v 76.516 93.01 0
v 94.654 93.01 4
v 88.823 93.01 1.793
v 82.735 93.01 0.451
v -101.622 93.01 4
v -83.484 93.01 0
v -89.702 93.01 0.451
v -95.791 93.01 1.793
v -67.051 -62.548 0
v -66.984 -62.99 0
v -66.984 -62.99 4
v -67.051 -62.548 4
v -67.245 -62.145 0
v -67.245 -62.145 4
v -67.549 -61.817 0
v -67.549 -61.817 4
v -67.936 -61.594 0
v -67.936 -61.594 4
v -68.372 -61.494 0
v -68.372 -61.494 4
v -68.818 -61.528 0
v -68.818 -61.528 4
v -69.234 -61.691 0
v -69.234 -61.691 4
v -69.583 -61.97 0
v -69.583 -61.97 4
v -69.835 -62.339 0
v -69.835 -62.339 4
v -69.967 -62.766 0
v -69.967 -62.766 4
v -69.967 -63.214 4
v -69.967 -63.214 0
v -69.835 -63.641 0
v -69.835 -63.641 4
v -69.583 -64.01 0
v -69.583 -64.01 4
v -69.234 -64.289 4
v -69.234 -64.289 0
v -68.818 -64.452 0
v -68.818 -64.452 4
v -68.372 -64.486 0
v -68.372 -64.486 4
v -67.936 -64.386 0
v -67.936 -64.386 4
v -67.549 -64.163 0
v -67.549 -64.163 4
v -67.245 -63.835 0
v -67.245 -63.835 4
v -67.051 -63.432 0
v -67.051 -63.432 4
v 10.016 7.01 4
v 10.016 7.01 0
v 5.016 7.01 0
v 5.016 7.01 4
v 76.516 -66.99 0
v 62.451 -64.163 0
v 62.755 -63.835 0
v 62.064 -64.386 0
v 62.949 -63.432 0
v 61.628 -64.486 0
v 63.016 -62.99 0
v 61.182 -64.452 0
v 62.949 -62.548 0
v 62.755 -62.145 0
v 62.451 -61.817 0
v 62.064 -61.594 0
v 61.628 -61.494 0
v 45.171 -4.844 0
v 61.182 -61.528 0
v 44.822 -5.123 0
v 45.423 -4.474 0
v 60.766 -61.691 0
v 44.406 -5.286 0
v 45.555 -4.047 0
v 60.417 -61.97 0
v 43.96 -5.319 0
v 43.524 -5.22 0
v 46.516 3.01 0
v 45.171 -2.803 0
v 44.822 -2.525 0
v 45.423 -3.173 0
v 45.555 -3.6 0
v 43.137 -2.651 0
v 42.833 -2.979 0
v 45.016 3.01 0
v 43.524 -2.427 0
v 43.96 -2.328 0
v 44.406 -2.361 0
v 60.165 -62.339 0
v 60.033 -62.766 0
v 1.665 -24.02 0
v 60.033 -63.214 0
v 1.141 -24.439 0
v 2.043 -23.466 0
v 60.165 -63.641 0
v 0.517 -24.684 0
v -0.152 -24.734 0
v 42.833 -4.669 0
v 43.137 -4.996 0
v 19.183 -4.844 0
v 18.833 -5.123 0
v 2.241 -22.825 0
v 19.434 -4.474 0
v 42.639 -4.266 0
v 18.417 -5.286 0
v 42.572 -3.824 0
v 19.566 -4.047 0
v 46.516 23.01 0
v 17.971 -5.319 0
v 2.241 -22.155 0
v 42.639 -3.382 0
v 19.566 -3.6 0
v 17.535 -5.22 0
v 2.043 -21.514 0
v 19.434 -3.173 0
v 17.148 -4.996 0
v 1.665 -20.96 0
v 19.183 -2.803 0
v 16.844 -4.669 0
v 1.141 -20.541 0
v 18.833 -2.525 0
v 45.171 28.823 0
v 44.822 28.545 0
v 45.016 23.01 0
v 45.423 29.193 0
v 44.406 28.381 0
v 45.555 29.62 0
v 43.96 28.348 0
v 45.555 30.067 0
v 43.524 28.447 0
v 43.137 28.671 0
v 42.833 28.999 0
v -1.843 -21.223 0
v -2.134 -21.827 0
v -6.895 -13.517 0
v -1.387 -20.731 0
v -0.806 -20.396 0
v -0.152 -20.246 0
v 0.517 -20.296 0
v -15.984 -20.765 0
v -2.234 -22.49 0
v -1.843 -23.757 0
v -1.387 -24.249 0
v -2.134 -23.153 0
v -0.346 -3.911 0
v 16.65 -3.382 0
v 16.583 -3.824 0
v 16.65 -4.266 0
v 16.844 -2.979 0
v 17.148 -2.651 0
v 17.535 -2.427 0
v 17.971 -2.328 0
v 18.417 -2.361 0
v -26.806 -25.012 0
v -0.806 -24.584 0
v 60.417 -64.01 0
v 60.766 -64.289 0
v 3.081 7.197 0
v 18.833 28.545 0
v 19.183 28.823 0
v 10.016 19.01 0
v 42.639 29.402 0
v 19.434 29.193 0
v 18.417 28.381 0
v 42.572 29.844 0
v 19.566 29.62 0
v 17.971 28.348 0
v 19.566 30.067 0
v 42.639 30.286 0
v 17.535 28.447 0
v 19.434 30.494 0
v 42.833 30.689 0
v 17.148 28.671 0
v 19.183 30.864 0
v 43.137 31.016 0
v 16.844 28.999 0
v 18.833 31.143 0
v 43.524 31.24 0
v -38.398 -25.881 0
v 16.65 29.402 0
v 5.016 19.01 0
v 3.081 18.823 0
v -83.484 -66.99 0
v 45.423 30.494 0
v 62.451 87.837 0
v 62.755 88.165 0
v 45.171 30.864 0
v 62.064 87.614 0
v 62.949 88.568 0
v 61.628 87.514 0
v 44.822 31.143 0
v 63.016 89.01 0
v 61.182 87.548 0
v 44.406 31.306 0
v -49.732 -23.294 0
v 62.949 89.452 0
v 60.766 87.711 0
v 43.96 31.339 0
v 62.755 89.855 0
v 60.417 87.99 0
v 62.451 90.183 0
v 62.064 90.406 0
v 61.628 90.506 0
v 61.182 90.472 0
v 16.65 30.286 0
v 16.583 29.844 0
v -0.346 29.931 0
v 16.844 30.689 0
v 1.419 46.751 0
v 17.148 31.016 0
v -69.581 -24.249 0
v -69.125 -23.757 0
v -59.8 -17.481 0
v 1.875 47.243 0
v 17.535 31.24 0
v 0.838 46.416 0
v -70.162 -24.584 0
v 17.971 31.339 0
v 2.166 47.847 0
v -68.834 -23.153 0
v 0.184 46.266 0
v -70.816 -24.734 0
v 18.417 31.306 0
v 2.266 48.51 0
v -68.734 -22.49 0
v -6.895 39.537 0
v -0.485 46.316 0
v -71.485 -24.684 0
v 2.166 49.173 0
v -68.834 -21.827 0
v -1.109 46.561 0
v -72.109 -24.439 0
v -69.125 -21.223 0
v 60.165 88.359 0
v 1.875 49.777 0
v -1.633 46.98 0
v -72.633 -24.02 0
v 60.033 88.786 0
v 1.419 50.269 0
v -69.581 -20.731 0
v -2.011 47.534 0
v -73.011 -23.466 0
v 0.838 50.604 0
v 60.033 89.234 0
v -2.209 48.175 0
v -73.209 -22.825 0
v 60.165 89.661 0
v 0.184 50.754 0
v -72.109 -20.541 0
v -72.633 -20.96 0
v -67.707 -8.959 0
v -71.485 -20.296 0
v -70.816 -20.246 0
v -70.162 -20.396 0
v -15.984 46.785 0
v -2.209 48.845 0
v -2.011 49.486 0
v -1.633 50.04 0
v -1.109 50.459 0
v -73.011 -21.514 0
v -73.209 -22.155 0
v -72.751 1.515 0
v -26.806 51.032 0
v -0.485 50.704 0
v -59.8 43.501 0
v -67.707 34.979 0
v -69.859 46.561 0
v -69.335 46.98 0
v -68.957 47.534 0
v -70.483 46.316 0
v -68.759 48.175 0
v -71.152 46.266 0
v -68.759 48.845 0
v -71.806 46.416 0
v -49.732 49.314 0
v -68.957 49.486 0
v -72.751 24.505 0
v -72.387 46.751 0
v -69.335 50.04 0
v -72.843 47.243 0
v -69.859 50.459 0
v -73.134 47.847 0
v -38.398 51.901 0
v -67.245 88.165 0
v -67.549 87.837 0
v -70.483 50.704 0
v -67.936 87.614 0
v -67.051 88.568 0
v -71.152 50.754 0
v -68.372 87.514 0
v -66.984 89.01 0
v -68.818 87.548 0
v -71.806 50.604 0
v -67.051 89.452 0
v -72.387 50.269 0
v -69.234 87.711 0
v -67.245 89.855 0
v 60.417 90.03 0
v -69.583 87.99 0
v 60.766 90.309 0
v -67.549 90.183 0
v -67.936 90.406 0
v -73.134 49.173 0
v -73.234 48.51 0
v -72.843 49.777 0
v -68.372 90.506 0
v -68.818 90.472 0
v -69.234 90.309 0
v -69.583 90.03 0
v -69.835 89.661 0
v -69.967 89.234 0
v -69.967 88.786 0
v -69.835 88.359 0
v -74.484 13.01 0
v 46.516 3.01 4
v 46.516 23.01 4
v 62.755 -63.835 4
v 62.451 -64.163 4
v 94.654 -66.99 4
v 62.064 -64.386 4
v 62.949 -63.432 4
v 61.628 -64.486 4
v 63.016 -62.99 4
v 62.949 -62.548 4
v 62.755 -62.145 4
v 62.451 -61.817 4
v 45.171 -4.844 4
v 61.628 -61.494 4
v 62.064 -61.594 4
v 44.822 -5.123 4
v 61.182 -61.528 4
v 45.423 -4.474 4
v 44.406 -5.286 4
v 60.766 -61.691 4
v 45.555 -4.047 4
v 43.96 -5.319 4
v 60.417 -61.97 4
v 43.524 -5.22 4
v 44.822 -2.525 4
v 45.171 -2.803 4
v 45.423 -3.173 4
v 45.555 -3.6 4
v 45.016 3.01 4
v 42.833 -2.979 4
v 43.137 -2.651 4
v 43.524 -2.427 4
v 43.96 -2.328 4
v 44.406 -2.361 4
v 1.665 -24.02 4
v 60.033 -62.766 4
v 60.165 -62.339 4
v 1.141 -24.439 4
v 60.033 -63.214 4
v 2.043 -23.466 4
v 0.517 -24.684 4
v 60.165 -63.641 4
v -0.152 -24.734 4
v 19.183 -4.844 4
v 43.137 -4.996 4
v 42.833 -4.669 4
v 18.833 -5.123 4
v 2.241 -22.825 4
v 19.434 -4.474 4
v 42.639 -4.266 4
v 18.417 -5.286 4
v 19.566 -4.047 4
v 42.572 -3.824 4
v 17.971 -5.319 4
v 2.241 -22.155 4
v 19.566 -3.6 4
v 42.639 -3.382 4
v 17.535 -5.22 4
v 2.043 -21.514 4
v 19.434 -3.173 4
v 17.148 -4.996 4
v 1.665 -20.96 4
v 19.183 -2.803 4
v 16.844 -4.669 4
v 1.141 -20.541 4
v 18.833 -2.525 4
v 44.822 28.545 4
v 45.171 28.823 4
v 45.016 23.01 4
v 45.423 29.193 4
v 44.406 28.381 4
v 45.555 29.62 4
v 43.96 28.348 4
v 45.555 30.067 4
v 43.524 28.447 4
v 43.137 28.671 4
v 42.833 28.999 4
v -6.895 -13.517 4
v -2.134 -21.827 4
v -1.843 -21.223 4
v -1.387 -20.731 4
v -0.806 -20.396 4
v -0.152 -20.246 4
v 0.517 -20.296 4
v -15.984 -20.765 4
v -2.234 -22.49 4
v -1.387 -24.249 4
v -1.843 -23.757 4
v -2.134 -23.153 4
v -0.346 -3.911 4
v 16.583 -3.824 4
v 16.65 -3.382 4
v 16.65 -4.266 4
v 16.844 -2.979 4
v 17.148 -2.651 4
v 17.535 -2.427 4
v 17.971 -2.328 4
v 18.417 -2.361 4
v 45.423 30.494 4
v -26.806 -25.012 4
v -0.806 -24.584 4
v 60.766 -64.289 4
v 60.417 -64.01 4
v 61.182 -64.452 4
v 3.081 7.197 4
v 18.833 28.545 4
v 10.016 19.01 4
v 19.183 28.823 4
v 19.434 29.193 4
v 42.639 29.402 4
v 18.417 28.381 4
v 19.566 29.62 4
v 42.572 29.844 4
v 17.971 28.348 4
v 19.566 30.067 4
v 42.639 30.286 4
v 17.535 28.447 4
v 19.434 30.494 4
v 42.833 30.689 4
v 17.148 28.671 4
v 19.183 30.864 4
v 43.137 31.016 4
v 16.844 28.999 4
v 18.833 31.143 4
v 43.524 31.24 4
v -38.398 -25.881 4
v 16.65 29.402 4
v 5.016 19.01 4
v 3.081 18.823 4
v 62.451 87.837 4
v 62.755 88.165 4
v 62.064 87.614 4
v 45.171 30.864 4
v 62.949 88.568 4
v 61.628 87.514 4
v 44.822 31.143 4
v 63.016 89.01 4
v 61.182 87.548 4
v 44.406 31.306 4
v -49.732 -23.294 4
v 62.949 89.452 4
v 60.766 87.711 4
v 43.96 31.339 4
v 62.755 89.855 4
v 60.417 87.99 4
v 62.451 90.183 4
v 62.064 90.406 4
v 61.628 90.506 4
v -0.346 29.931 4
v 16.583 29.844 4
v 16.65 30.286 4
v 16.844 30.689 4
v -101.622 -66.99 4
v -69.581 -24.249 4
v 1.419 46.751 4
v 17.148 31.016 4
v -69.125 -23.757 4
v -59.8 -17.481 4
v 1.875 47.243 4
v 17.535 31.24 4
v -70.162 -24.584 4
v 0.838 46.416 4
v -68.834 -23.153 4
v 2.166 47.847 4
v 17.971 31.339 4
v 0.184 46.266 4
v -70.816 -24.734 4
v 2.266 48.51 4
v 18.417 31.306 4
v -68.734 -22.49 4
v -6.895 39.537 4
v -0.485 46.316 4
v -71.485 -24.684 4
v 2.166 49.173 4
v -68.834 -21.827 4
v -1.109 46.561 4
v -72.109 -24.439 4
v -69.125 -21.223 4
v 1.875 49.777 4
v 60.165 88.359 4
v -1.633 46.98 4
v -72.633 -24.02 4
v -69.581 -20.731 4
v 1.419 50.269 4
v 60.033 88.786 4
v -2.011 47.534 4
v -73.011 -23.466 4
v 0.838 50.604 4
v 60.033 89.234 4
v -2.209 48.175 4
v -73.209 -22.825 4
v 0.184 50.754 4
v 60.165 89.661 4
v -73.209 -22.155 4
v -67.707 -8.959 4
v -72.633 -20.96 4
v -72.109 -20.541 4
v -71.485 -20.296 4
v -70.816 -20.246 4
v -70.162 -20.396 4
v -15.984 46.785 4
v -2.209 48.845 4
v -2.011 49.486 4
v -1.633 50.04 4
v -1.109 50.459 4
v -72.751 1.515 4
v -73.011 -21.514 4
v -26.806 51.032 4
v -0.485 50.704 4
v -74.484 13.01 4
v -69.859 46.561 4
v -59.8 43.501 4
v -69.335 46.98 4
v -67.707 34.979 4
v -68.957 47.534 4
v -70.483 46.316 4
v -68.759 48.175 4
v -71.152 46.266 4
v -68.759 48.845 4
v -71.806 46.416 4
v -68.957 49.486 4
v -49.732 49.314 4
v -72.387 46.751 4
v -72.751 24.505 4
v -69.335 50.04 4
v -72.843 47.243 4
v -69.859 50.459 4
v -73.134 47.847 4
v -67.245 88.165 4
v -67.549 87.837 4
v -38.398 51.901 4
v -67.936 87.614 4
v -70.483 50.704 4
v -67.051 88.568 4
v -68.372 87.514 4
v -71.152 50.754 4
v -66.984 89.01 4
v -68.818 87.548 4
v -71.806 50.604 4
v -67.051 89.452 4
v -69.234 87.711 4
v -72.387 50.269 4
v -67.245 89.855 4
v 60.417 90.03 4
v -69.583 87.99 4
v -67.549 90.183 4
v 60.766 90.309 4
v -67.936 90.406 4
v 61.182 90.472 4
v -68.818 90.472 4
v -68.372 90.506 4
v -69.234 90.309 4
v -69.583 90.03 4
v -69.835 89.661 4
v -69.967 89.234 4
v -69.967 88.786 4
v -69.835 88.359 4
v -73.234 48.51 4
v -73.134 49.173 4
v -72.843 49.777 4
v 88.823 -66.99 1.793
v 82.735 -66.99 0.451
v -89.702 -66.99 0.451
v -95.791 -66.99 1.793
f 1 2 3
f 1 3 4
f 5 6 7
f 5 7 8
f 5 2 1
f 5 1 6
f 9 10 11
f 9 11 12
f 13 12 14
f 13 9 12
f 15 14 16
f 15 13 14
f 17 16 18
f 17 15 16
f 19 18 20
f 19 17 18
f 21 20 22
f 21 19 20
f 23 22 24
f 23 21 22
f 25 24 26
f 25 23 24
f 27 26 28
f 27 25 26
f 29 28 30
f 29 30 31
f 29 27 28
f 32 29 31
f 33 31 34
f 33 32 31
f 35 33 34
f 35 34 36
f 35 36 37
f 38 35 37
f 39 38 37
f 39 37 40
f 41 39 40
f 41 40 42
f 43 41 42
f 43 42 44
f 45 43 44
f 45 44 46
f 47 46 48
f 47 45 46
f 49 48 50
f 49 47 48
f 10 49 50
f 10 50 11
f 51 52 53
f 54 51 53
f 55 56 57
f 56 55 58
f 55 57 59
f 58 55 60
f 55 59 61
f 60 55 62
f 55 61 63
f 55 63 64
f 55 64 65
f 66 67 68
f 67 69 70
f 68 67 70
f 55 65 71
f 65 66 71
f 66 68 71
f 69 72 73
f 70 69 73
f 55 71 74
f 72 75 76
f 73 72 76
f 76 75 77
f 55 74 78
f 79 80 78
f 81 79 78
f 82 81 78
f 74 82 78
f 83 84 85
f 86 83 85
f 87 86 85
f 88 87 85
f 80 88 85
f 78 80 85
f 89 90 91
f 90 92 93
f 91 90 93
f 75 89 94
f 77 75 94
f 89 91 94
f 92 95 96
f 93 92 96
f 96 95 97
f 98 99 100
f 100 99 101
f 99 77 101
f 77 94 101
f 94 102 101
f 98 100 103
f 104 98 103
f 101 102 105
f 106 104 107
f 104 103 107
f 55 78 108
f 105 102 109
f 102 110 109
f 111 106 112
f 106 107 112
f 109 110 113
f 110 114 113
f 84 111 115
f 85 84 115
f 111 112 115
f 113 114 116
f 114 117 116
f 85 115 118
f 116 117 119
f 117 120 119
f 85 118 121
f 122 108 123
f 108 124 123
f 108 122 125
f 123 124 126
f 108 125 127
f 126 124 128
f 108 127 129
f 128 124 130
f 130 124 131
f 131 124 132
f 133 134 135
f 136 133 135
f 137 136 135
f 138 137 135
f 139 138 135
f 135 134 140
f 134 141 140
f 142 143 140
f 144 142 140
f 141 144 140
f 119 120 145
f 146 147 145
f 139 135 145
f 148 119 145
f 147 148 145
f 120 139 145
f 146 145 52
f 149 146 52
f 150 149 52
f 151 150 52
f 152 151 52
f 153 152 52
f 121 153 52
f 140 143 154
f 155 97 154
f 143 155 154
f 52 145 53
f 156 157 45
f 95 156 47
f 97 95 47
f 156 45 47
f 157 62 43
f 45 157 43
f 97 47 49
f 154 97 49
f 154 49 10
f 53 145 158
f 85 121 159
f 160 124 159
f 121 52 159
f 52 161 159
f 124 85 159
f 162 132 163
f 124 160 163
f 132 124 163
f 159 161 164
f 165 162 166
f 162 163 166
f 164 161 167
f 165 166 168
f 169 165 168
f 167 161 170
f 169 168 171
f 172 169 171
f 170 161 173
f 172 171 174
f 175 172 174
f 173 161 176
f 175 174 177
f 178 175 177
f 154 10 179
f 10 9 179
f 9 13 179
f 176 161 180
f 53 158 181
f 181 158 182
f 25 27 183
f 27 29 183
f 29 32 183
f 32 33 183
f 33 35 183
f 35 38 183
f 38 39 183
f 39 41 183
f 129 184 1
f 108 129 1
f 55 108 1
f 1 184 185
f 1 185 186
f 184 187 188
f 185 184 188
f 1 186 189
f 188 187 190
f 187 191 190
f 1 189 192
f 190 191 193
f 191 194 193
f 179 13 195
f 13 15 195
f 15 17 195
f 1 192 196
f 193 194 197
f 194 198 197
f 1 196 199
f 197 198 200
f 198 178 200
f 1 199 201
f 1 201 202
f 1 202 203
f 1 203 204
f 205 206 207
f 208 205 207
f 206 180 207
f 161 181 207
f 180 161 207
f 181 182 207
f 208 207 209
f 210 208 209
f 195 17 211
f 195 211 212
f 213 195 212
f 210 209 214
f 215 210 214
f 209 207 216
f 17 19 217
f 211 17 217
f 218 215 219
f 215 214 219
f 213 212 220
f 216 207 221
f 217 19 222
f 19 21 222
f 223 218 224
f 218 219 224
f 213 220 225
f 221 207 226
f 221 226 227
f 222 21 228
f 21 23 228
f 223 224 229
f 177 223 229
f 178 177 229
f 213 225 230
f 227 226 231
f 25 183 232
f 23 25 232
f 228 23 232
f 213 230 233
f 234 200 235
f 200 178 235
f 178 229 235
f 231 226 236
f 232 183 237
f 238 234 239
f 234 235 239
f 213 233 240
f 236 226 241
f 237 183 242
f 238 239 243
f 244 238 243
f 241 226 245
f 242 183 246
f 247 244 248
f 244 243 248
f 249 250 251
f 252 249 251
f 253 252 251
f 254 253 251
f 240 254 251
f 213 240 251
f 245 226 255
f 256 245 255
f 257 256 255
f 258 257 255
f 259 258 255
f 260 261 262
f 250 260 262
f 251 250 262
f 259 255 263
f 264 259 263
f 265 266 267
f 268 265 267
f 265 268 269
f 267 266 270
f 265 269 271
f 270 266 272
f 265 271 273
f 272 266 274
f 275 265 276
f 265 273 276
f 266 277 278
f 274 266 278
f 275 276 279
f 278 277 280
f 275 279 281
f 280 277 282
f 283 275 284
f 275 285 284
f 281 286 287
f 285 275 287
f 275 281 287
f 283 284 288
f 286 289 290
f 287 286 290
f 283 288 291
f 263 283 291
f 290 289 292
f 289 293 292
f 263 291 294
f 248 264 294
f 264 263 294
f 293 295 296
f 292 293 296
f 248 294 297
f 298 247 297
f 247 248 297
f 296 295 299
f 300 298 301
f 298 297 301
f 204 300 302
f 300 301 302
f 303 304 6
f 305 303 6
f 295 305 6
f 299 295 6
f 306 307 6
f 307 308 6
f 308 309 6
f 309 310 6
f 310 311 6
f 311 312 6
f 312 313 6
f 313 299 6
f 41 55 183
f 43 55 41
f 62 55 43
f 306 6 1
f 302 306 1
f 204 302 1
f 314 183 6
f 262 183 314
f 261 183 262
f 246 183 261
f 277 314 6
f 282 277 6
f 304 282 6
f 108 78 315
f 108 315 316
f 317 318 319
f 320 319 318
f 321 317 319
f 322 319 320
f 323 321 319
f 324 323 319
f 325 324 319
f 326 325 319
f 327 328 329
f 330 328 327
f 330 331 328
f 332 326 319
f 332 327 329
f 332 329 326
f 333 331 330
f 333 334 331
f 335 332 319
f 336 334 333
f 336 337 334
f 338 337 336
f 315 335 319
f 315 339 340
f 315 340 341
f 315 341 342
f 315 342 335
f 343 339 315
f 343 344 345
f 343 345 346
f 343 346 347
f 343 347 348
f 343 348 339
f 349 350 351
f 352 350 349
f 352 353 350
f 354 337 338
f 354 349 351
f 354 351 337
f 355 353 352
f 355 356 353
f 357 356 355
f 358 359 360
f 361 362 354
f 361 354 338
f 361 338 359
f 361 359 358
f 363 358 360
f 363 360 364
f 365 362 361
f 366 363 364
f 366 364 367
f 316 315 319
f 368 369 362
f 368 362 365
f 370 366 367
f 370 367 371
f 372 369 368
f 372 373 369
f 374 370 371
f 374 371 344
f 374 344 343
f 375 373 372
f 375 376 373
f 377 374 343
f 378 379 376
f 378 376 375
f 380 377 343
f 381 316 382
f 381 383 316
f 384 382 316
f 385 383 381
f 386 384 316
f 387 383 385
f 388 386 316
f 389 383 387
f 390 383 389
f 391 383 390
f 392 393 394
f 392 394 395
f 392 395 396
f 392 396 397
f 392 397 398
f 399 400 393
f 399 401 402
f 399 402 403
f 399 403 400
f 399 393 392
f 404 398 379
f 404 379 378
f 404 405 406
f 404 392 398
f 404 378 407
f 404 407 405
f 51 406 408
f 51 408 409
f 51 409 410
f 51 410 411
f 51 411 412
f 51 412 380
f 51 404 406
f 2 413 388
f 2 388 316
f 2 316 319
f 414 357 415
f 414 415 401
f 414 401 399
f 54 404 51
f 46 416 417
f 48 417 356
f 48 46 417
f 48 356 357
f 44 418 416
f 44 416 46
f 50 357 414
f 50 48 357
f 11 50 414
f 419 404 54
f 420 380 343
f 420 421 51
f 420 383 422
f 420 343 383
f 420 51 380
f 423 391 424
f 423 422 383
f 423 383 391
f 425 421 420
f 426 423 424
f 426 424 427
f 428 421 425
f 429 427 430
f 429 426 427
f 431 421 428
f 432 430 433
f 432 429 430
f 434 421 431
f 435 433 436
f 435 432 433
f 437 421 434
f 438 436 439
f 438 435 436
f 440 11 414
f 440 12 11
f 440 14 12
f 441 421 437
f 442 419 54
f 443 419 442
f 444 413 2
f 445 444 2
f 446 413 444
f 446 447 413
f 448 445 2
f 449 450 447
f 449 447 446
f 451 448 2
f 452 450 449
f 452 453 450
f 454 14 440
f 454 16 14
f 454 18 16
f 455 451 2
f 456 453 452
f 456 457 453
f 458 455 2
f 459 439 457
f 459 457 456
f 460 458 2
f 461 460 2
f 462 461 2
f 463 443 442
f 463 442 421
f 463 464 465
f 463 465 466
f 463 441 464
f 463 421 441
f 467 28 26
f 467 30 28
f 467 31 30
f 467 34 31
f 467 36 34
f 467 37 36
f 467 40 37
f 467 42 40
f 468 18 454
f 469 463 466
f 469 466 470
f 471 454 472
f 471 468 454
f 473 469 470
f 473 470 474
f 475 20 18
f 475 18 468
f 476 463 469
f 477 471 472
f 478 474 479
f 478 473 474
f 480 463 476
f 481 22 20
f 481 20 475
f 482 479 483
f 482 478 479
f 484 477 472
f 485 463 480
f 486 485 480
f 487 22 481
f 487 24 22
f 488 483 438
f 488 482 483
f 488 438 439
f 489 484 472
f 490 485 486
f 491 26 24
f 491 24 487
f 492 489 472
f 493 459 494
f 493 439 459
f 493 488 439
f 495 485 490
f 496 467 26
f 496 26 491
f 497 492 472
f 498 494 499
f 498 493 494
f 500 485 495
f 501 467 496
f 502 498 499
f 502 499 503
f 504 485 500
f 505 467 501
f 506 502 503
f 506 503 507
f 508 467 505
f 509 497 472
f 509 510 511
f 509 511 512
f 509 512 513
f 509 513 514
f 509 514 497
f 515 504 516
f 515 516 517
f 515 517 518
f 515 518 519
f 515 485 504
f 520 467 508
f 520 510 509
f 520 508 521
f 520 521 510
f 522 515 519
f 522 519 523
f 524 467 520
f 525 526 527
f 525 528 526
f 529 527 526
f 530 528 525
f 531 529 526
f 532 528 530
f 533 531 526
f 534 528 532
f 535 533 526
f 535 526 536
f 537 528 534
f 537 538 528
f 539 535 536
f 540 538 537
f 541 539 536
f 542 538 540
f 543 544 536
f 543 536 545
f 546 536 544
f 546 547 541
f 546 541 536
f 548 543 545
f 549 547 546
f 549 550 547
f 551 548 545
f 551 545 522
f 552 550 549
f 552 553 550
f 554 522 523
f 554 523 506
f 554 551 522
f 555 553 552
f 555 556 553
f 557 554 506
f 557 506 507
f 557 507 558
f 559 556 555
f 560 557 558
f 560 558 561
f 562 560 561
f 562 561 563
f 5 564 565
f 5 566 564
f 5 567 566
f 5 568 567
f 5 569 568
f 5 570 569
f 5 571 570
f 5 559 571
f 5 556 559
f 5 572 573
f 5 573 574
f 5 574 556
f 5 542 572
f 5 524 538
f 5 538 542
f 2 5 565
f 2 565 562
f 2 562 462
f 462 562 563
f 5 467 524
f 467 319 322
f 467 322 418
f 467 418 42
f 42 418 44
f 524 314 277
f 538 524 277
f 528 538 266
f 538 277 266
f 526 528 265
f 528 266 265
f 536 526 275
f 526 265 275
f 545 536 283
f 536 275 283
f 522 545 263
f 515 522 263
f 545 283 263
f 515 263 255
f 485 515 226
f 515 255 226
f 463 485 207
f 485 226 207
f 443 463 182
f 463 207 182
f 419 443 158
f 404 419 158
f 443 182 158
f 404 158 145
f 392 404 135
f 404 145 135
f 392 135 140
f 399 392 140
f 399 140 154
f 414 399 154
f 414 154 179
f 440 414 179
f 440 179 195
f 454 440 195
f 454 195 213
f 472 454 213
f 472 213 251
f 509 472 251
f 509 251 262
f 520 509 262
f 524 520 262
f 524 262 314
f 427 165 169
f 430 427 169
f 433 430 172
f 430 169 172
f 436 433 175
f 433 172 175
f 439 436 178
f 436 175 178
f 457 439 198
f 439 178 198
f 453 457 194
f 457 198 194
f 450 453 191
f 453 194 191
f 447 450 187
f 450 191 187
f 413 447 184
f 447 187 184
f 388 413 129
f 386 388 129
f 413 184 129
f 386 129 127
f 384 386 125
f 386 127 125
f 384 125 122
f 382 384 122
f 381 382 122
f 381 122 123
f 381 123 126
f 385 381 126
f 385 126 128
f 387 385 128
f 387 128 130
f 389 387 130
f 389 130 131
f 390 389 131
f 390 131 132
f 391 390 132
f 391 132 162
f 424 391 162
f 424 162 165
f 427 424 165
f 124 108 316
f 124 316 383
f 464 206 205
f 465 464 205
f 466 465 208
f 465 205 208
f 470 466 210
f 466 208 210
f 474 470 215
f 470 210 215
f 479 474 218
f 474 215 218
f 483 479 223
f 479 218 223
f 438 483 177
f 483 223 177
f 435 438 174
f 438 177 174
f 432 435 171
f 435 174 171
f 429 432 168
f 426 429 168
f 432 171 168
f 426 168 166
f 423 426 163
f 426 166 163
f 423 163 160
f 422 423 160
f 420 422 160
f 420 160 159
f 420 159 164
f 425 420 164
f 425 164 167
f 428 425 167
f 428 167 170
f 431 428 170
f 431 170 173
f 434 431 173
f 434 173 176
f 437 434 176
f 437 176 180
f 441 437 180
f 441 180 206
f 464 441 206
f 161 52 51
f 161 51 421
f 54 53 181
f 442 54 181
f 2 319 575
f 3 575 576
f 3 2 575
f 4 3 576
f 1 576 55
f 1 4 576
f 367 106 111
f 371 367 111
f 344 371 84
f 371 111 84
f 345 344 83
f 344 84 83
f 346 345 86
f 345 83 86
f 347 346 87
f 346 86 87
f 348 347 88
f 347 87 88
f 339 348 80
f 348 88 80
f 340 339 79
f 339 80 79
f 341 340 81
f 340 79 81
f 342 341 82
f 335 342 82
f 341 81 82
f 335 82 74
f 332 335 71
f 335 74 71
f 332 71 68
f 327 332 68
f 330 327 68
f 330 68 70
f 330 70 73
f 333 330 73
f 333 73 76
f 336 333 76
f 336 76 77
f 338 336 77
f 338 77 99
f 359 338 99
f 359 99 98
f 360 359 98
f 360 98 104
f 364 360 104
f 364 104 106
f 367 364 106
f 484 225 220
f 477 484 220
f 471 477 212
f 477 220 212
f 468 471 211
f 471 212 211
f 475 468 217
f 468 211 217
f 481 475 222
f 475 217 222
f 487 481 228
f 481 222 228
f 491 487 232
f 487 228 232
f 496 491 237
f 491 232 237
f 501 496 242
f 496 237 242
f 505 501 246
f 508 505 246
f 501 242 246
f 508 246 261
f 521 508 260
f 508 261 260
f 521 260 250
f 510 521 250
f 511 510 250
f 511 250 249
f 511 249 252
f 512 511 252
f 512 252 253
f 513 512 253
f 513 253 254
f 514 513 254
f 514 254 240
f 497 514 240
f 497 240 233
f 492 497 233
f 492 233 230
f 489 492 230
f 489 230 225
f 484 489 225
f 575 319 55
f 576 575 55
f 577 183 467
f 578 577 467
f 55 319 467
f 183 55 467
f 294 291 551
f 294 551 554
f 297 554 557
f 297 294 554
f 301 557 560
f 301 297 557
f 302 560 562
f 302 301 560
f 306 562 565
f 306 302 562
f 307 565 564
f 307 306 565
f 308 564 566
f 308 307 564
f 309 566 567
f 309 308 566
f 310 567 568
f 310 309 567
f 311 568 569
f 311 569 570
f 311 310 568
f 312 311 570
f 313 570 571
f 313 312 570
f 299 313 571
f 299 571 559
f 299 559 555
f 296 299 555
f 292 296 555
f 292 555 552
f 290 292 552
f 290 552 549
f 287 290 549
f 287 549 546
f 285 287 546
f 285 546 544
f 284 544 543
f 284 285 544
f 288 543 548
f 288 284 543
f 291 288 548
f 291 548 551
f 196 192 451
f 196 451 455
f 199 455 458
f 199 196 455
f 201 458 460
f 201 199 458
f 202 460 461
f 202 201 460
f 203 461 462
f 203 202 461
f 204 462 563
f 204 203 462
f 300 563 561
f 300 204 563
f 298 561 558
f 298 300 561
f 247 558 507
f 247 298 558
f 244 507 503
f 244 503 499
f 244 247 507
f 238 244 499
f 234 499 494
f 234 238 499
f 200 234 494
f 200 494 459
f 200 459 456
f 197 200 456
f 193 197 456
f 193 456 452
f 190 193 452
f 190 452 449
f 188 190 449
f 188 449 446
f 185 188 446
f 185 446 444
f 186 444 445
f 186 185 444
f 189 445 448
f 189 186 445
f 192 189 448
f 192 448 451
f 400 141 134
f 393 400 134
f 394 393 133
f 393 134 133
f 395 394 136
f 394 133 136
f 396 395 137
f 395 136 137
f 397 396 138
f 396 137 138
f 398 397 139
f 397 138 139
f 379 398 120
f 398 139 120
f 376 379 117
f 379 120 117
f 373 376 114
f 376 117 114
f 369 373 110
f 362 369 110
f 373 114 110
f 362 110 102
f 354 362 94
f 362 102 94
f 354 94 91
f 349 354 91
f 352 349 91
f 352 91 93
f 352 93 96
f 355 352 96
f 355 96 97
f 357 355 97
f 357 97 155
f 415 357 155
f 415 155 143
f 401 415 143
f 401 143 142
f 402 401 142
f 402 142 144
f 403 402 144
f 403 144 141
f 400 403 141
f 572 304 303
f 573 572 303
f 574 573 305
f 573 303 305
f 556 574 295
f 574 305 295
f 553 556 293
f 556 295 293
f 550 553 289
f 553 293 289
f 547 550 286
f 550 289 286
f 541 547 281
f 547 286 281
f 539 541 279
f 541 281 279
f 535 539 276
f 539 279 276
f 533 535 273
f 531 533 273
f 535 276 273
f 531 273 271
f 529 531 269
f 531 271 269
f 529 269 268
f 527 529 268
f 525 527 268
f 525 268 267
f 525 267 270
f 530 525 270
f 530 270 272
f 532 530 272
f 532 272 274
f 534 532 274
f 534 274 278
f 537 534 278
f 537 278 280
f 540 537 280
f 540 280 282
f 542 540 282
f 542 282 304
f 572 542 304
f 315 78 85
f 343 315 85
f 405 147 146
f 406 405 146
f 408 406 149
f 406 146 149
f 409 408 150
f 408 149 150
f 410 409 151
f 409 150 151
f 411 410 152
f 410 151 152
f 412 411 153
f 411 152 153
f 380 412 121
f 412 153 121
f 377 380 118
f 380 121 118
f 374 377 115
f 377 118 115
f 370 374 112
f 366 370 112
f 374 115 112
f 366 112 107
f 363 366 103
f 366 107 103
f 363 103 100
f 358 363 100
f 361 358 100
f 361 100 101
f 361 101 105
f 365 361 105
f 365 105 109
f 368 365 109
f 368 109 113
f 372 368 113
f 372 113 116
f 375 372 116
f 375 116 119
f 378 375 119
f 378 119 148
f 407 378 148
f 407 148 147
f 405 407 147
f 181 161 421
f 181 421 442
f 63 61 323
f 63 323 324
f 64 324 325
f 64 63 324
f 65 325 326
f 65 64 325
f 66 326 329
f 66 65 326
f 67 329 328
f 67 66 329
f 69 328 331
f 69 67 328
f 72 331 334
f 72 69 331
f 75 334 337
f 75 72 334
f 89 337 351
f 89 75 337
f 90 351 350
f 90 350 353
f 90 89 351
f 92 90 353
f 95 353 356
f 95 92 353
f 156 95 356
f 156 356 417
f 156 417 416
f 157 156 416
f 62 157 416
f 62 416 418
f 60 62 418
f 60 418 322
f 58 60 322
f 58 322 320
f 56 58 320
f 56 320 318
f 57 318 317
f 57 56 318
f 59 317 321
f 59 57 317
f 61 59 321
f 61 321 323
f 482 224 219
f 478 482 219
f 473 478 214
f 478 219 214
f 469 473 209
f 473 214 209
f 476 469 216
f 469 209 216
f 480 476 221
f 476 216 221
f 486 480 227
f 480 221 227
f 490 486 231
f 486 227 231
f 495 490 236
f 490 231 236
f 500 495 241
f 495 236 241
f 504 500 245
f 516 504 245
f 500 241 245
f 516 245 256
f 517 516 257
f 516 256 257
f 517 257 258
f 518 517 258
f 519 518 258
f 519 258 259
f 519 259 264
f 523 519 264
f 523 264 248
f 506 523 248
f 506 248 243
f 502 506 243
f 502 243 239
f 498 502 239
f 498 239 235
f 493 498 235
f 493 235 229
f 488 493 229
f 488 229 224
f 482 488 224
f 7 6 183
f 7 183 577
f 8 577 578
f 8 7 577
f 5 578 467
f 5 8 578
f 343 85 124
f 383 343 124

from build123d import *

# Parameters (mm, degrees)
SCHIZZO1_W                   = 160
SCHIZZO1_H                   = 160
SCHIZZO1_R                   = 1.5
ESTRUSIONE_ESTRUSIONE1_DEPTH = 4
SCHIZZO2_R                   = 1.5
SCHIZZO2_W                   = 1.5
SCHIZZO2_H                   = 20
TAGLIO_ESTRUSIONE1_DEPTH     = 36
SCHIZZO3_R                   = 39
SCHIZZO3_R_2                 = 2.25
SCHIZZO3_W                   = 5
SCHIZZO3_H                   = 12
TAGLIO_ESTRUSIONE2_DEPTH     = 7
SCHIZZO4_W                   = 4
SCHIZZO4_H                   = 160
ESTRUSIONE_ESTRUSIONE2_DEPTH = 18.13835714
SCHIZZO5_W                   = 4
SCHIZZO5_H                   = 160
ESTRUSIONE_ESTRUSIONE3_DEPTH = 18.13835714
TAGLIO_ESTRUSIONE3_DEPTH     = 229.13835714


with BuildPart() as part:
    # Schizzo1 → Estrusione-Estrusione1 (new body)
    with BuildSketch(Plane.XY):
        with Locations((-3.483874863, 13.01)):
            Rectangle(SCHIZZO1_W, SCHIZZO1_H)
        with Locations((-68.483874863, 89.01)):
            Circle(SCHIZZO1_R, mode=Mode.SUBTRACT)
        with Locations((61.516125137, 89.01)):
            Circle(SCHIZZO1_R, mode=Mode.SUBTRACT)
        with Locations((-68.483874863, -62.99)):
            Circle(SCHIZZO1_R, mode=Mode.SUBTRACT)
        with Locations((61.516125137, -62.99)):
            Circle(SCHIZZO1_R, mode=Mode.SUBTRACT)
    extrude(amount=ESTRUSIONE_ESTRUSIONE1_DEPTH)

    # Schizzo2 → Taglio-Estrusione1 (cut)
    with BuildSketch(Plane(origin=(0, 0, 0), x_dir=(-1, 0, 0), z_dir=(0, 0, -1))):
        with Locations((-44.071905048, 29.8436475)):
            Circle(SCHIZZO2_R)
        with Locations((-44.071905048, -3.8236475)):
            Circle(SCHIZZO2_R)
        with Locations((-18.082922837, -3.8236475)):
            Circle(SCHIZZO2_R)
        with Locations((-18.082922837, 29.8436475)):
            Circle(SCHIZZO2_R)
        with Locations((-45.766125137, 13.01)):
            Rectangle(SCHIZZO2_W, SCHIZZO2_H)
    extrude(amount=-TAGLIO_ESTRUSIONE1_DEPTH, mode=Mode.SUBTRACT)

    # Schizzo3 → Taglio-Estrusione2 (cut)
    with BuildSketch(Plane(origin=(0, 0, 0), x_dir=(-1, 0, 0), z_dir=(0, 0, -1))):
        with Locations((35.483874863, 13.01)):
            Circle(SCHIZZO3_R)
        with Locations((70.98387486, 48.509999997)):
            Circle(SCHIZZO3_R_2)
        with Locations(Location((70.98387486, -22.489999997, 0), (0, 0, 180))):
            Circle(SCHIZZO3_R_2)
        with Locations(Location((-0.016125134, 48.509999997, 0), (0, 0, 180))):
            Circle(SCHIZZO3_R_2)
        with Locations((-0.016125134, -22.489999997)):
            Circle(SCHIZZO3_R_2)
        with Locations((-7.516125137, 13.01)):
            Rectangle(SCHIZZO3_W, SCHIZZO3_H)
    extrude(amount=-TAGLIO_ESTRUSIONE2_DEPTH, mode=Mode.SUBTRACT)

    # Schizzo4 → Estrusione-Estrusione2 (add)
    with BuildSketch(Plane.ZY.offset(83.483874863)):
        with Locations((2, 13.01)):
            Rectangle(SCHIZZO4_W, SCHIZZO4_H)
    extrude(amount=ESTRUSIONE_ESTRUSIONE2_DEPTH)

    # Schizzo5 → Estrusione-Estrusione3 (add)
    with BuildSketch(Plane(origin=(76.516125137, 0, 0), x_dir=(0, 0, -1), z_dir=(1, 0, 0))):
        with Locations((-2, 13.01)):
            Rectangle(SCHIZZO5_W, SCHIZZO5_H)
    extrude(amount=ESTRUSIONE_ESTRUSIONE3_DEPTH)

    # Schizzo6 → Taglio-Estrusione3 (cut)
    with BuildSketch(Plane(origin=(0, 93.01, 0), x_dir=(1, 0, 0), z_dir=(0, 1, 0))):
        with BuildLine():
            Line((-101.622232003, -4), (-101.622232003, 0))
            Line((-101.622232003, 0), (-83.483874863, 0))
            ThreePointArc((-83.483874863, 0), (-92.77096267, -1.011871109), (-101.622232003, -4))
        make_face()
        with BuildLine():
            Line((76.516125137, 0), (94.654482277, 0))
            Line((94.654482277, 0), (94.654482277, -4))
            ThreePointArc((94.654482277, -4), (85.803212944, -1.011871109), (76.516125137, 0))
        make_face()
    extrude(amount=-TAGLIO_ESTRUSIONE3_DEPTH, mode=Mode.SUBTRACT)


solid = part.part
